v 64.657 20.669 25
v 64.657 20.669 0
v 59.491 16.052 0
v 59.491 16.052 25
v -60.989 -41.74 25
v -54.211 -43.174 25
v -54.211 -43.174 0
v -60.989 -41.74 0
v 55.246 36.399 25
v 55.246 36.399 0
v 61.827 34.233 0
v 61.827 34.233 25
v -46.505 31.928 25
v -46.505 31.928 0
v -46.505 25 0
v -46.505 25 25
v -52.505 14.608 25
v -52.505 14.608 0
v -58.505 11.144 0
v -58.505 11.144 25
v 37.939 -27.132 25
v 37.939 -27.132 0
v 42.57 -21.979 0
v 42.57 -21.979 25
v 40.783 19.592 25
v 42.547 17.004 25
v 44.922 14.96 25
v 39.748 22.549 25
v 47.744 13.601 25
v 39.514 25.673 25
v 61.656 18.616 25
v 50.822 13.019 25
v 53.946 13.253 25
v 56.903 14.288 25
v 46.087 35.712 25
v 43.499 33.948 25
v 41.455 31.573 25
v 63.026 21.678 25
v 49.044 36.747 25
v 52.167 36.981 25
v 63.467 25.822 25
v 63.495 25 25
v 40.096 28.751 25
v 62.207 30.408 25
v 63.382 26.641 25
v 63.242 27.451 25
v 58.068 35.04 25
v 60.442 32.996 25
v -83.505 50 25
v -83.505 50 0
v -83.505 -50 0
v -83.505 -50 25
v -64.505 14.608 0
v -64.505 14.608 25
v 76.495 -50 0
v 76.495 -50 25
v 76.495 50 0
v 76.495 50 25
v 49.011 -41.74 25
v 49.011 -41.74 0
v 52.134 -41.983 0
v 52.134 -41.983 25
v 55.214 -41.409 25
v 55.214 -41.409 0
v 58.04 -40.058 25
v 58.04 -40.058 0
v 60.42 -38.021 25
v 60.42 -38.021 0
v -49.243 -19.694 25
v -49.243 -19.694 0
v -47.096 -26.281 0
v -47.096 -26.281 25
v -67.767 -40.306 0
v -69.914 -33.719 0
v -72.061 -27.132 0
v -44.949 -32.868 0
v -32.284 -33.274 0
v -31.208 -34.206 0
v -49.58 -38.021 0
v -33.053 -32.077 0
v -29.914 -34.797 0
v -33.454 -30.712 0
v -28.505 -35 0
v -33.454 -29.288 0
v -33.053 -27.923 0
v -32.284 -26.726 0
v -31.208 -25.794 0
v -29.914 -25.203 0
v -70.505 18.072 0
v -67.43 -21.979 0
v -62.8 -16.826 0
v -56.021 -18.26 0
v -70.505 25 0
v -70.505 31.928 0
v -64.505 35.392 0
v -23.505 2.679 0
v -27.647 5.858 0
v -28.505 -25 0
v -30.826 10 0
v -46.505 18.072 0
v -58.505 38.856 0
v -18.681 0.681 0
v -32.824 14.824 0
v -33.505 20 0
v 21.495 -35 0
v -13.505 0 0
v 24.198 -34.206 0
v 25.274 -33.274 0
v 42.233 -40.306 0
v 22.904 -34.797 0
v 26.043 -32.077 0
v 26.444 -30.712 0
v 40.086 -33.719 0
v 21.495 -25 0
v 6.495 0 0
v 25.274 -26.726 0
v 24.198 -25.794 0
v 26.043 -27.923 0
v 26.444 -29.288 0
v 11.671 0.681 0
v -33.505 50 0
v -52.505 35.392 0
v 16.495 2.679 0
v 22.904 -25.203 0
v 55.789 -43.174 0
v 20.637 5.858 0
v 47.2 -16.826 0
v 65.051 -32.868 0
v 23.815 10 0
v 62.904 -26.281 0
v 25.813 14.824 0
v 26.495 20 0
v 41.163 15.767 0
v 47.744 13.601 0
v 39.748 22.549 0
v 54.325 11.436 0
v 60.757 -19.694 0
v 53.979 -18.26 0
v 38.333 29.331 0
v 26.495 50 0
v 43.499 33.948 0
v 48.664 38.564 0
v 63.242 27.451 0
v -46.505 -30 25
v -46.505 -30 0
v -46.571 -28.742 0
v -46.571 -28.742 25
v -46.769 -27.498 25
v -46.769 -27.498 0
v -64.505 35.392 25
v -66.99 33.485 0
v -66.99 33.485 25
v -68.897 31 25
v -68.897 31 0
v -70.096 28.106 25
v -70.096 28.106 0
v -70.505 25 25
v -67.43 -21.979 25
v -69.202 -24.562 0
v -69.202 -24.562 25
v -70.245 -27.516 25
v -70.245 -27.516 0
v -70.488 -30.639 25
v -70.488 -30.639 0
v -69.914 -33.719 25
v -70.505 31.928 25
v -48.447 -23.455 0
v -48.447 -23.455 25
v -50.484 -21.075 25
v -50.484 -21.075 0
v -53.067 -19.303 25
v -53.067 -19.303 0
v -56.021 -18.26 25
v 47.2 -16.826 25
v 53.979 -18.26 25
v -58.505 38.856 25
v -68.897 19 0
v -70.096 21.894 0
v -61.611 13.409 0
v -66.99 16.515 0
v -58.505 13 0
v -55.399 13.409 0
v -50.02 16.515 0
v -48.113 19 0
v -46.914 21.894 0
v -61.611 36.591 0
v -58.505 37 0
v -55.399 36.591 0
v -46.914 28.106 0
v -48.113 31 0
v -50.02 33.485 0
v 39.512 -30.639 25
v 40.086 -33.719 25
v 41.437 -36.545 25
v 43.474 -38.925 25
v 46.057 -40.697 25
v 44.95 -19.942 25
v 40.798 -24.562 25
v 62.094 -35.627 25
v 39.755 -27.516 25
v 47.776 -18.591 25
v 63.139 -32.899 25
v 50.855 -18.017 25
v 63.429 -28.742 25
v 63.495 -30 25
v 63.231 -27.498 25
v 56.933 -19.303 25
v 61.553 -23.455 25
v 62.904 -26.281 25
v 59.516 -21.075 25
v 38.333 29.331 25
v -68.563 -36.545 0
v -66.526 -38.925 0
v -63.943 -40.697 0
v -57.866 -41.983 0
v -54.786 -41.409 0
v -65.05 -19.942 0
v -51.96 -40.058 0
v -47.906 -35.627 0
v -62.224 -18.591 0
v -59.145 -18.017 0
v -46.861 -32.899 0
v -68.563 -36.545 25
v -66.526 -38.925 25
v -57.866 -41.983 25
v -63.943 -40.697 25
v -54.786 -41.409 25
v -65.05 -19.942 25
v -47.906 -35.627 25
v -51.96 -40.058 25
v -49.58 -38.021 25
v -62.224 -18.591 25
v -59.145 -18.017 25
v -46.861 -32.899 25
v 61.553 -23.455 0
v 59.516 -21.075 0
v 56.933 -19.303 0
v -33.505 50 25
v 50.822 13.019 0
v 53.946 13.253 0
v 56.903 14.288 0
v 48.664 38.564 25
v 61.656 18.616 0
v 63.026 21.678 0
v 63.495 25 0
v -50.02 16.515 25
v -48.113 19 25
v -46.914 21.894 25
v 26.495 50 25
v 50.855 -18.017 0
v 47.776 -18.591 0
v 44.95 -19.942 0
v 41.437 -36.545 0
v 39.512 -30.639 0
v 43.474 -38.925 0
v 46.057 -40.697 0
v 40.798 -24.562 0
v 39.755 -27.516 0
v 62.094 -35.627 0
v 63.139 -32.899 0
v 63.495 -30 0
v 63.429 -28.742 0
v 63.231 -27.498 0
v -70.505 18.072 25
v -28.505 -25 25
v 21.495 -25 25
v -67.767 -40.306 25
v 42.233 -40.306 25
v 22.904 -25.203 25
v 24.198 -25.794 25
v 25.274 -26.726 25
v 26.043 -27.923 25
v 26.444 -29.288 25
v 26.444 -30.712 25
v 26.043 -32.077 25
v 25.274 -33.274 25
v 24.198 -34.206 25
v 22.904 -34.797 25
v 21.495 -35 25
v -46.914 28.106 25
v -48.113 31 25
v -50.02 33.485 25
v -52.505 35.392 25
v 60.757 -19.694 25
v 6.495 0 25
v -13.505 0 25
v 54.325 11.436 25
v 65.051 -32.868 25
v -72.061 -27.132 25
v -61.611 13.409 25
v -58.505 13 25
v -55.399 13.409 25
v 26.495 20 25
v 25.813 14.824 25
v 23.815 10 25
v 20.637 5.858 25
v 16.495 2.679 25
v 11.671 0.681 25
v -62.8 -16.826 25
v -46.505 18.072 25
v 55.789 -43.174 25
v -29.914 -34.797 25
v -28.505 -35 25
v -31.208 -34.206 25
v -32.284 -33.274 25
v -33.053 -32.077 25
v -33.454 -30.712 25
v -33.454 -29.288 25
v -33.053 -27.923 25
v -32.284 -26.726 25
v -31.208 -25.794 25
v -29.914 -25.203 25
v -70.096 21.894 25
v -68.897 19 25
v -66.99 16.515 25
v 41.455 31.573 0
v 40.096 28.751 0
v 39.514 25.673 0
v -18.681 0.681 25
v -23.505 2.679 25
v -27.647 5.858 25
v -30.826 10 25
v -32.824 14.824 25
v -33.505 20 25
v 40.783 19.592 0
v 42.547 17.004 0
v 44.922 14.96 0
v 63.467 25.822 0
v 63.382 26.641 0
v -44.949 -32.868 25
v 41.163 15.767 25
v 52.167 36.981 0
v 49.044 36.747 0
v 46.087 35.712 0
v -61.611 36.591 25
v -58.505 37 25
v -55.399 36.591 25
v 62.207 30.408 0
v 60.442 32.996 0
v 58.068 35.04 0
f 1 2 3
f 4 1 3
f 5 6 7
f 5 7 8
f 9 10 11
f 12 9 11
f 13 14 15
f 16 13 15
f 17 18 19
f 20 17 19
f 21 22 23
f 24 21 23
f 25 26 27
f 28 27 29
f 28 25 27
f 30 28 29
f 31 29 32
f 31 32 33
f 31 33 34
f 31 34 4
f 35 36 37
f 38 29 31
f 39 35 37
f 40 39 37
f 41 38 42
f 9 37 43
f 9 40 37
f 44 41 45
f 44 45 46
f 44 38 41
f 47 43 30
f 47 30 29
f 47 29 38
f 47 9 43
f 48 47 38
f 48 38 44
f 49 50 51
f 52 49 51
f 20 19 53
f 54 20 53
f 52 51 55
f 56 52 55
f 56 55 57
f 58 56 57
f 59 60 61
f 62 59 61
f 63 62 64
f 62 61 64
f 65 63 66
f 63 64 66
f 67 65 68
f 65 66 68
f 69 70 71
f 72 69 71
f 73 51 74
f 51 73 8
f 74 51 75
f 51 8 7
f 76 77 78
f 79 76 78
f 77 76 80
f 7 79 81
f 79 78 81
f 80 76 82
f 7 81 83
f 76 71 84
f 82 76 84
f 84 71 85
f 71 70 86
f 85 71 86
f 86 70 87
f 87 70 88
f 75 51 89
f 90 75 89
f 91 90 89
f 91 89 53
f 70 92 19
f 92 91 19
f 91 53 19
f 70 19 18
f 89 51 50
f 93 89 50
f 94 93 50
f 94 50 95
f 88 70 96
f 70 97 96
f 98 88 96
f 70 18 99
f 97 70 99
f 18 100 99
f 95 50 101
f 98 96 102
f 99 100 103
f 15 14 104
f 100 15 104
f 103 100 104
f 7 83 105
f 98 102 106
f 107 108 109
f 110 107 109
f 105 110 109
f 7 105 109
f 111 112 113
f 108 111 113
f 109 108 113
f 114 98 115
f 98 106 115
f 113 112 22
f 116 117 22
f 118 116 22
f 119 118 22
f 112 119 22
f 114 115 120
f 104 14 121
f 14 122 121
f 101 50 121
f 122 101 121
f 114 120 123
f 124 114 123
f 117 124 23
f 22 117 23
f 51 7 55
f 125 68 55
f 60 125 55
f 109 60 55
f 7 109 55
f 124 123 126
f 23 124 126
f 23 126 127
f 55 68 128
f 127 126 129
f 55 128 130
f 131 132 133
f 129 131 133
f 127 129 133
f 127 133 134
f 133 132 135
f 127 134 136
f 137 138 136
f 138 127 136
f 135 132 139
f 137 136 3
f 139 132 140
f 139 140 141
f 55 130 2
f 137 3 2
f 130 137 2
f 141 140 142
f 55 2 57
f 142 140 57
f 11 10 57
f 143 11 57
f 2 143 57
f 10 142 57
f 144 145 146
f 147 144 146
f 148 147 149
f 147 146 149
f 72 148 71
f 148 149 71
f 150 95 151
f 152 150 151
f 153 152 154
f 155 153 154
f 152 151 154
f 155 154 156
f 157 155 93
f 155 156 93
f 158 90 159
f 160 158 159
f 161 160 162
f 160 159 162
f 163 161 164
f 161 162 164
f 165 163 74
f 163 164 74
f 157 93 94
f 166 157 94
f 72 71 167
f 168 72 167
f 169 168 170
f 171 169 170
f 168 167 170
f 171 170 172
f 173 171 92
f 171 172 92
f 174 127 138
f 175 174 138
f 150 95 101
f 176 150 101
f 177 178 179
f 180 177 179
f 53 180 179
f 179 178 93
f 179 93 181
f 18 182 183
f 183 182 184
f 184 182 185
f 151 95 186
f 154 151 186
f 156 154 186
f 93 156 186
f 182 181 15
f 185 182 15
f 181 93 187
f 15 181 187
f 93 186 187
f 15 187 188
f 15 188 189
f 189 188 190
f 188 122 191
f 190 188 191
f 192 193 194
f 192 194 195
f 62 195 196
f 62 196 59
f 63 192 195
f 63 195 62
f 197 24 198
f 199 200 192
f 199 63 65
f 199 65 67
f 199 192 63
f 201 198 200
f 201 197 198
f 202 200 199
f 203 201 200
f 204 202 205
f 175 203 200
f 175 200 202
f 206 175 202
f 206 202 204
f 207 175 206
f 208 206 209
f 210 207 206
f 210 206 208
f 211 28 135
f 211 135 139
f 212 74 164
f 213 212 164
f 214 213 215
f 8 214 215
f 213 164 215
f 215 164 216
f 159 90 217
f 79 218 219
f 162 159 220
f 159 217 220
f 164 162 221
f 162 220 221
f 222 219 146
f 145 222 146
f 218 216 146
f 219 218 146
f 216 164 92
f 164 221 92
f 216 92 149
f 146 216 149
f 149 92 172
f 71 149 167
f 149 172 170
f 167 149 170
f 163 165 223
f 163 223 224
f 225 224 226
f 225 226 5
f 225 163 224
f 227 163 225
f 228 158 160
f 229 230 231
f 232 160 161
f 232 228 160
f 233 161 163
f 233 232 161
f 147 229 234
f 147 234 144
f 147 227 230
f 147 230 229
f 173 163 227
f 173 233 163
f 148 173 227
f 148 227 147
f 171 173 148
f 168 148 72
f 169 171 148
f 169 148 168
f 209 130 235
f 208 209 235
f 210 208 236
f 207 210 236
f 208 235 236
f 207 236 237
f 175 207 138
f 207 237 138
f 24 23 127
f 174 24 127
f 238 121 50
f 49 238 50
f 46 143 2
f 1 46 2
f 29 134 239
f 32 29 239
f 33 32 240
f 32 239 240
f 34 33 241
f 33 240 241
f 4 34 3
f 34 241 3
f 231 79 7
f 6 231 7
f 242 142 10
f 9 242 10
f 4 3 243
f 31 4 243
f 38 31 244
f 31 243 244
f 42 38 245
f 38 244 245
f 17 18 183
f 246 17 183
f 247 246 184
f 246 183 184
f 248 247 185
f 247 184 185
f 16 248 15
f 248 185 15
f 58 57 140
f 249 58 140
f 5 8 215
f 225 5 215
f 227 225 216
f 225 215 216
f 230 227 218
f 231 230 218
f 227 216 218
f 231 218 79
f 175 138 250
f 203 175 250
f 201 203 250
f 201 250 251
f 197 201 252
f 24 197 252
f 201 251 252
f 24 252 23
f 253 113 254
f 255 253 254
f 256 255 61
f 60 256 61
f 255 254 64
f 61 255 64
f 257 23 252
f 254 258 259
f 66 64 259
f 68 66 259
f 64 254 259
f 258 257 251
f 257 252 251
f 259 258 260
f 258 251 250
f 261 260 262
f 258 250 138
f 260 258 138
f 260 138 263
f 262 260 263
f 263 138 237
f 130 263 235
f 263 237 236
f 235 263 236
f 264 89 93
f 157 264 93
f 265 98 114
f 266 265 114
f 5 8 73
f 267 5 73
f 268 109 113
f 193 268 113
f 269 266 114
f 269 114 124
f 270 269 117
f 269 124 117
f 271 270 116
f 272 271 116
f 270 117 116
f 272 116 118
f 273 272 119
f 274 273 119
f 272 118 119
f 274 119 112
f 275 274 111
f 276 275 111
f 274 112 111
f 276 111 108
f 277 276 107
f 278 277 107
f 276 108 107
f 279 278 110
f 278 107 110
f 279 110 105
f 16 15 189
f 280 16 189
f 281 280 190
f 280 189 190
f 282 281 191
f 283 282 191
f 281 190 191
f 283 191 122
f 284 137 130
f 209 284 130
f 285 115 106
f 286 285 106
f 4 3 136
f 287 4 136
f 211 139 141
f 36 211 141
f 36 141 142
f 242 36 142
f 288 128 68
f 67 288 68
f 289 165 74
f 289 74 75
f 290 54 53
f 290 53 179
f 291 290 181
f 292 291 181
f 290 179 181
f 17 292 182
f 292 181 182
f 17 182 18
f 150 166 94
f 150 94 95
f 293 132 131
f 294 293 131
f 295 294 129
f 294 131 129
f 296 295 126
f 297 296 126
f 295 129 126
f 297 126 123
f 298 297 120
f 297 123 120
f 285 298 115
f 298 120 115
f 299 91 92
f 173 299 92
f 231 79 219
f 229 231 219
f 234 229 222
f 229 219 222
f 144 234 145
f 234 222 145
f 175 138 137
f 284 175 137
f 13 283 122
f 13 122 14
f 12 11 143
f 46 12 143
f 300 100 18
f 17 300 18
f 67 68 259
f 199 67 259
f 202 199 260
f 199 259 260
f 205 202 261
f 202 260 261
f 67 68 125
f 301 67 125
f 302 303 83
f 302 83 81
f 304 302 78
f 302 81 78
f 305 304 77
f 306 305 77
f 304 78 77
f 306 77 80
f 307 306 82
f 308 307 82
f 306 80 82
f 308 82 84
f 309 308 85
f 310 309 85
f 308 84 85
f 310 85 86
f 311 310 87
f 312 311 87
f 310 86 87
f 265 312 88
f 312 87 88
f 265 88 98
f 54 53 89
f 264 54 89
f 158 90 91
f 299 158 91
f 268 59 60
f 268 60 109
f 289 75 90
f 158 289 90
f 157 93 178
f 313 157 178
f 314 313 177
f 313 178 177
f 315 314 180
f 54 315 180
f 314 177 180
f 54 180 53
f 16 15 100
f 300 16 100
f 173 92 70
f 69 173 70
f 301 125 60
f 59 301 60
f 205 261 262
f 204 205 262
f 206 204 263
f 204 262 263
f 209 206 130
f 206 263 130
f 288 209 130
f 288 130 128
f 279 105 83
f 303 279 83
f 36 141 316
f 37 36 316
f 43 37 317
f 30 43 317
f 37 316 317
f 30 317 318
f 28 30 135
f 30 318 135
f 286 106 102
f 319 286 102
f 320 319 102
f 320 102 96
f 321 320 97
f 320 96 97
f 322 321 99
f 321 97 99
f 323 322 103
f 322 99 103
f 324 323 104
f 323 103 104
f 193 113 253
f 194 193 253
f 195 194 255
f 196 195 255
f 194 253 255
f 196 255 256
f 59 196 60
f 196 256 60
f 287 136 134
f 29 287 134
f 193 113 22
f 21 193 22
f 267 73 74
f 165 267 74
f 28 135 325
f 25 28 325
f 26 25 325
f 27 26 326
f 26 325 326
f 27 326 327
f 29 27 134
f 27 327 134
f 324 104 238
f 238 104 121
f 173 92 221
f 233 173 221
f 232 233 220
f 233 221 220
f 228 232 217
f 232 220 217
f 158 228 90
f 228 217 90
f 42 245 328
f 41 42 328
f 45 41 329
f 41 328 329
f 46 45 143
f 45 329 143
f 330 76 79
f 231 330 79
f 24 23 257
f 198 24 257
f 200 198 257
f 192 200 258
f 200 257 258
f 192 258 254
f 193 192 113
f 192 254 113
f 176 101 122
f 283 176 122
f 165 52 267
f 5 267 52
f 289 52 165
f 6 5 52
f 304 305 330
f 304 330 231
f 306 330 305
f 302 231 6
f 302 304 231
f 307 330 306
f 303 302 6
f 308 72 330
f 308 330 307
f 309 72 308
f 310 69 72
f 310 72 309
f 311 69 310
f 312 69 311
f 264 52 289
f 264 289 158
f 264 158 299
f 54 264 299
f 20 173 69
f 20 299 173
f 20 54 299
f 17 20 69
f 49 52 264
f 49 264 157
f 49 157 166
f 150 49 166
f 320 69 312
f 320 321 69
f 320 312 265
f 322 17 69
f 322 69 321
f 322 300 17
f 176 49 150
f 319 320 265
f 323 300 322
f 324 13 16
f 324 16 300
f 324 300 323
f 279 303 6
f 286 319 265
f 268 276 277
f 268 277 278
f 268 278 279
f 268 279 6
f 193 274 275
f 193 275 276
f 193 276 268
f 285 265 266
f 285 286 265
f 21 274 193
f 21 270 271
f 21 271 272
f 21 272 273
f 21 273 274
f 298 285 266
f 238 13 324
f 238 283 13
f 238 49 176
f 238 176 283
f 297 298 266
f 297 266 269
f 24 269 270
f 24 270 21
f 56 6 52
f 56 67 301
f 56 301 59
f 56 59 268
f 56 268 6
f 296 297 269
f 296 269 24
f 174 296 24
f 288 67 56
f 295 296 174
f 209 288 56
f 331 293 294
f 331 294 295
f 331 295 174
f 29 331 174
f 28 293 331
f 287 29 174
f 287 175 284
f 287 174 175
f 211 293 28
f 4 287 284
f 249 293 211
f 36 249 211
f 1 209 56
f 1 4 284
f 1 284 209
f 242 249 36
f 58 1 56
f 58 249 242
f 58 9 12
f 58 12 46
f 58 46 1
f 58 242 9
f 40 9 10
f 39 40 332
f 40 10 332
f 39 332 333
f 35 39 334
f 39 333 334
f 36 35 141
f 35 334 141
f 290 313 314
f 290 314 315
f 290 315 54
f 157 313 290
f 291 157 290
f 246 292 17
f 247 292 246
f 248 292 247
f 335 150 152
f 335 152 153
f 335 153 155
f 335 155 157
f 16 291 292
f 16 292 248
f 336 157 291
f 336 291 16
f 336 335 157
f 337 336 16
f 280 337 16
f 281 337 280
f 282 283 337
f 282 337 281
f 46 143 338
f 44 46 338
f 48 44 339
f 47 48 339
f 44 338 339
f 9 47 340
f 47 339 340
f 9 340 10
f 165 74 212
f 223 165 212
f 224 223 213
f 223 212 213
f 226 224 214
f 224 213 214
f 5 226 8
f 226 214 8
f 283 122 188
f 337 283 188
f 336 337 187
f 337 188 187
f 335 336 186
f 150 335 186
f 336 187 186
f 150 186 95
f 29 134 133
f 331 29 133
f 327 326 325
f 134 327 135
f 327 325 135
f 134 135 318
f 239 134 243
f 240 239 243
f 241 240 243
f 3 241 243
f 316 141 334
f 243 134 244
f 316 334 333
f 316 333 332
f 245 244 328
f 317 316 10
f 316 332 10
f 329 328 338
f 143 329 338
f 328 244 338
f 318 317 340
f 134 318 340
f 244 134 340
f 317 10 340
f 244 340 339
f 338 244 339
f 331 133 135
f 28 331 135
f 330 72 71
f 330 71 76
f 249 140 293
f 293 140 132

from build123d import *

# Parameters (mm, degrees)
F1_DEPTH = 25


with BuildPart() as f1:
    # F0 (on Top) → F1 (new body)
    with BuildSketch(Plane.XY):
        with BuildLine():
            Line((-58.5051, -50), (-28.5051, -50))
            Line((-28.5051, -50), (21.4949, -50))
            Line((21.4949, -50), (51.4949, -50))
            Line((51.4949, -50), (76.4949, -50))
            Line((76.4949, -50), (76.4949, -30))
            Line((76.4949, -30), (76.4949, 25))
            Line((76.4949, 25), (76.4949, 50))
            Line((76.4949, 50), (26.4949, 50))
            Line((26.4949, 50), (26.4949, 20))
            ThreePointArc((26.4949, 20), (20.637035, 5.857864), (6.4949, 0))
            Line((6.4949, 0), (-13.5051, 0))
            ThreePointArc((-13.5051, 0), (-27.647236, 5.857864), (-33.5051, 20))
            Line((-33.5051, 20), (-33.5051, 50))
            Line((-33.5051, 50), (-83.5051, 50))
            Line((-83.5051, 50), (-83.5051, 25))
            Line((-83.5051, 25), (-83.5051, -30))
            Line((-83.5051, -30), (-83.5051, -50))
            Line((-83.5051, -50), (-58.5051, -50))
        make_face()
        Polygon((-49.243183, -19.693842), (-47.095965, -26.280909), (-44.948747, -32.867977), (-49.579706, -38.021056), (-54.210664, -43.174135), (-60.988841, -41.740146), (-67.767017, -40.306158), (-69.914235, -33.719091), (-72.061453, -27.132023), (-67.430495, -21.978944), (-62.799536, -16.825865), (-56.02136, -18.259854), align=None, mode=Mode.SUBTRACT)
        with BuildLine():
            ThreePointArc((21.4949, -25), (26.4949, -30), (21.4949, -35))
            Line((21.4949, -35), (-28.5051, -35))
            ThreePointArc((-28.5051, -35), (-33.5051, -30), (-28.5051, -25))
            Line((-28.5051, -25), (21.4949, -25))
        make_face(mode=Mode.SUBTRACT)
        Polygon((60.756817, -19.693842), (62.904035, -26.280909), (65.051253, -32.867977), (60.420295, -38.021055), (55.789336, -43.174135), (49.011158, -41.740146), (42.232983, -40.306158), (40.085765, -33.719091), (37.938547, -27.132023), (42.569505, -21.978944), (47.200464, -16.825865), (53.97864, -18.259854), align=None, mode=Mode.SUBTRACT)
        Polygon((-46.5051, 31.928203), (-46.5051, 25), (-46.5051, 18.071797), (-52.5051, 14.607695), (-58.5051, 11.143594), (-64.5051, 14.607695), (-70.5051, 18.071797), (-70.5051, 25), (-70.5051, 31.928203), (-64.5051, 35.392305), (-58.5051, 38.856406), (-52.5051, 35.392305), align=None, mode=Mode.SUBTRACT)
        Polygon((61.82662, 34.233394), (63.241867, 27.451279), (64.657113, 20.669165), (59.491254, 16.052468), (54.325393, 11.435771), (47.744286, 13.601189), (41.16318, 15.766606), (39.747933, 22.548721), (38.332686, 29.330835), (43.498546, 33.947532), (48.664406, 38.564229), (55.245513, 36.398811), align=None, mode=Mode.SUBTRACT)
        with BuildLine():
            ThreePointArc((-52.5051, 14.607695), (-48.112795, 19), (-46.5051, 25))
            ThreePointArc((-46.5051, 25), (-48.112795, 31), (-52.5051, 35.392305))
            ThreePointArc((-52.5051, 35.392305), (-58.5051, 37), (-64.5051, 35.392305))
            ThreePointArc((-64.5051, 35.392305), (-68.897405, 31), (-70.5051, 25))
            ThreePointArc((-70.5051, 25), (-68.897405, 19), (-64.5051, 14.607695))
            ThreePointArc((-64.5051, 14.607695), (-58.5051, 13), (-52.5051, 14.607695))
        make_face()
        with BuildLine():
            ThreePointArc((-49.579706, -38.021056), (-47.300085, -34.295071), (-46.5051, -30))
            ThreePointArc((-46.5051, -30), (-46.653737, -28.117133), (-47.095965, -26.280909))
            ThreePointArc((-47.095965, -26.280909), (-50.484045, -21.074605), (-56.02136, -18.259854))
            ThreePointArc((-56.02136, -18.259854), (-62.224191, -18.590865), (-67.430495, -21.978944))
            ThreePointArc((-67.430495, -21.978944), (-70.245246, -27.516259), (-69.914235, -33.719091))
            ThreePointArc((-69.914235, -33.719091), (-66.526156, -38.925394), (-60.988841, -41.740146))
            ThreePointArc((-60.988841, -41.740146), (-54.78601, -41.409135), (-49.579706, -38.021056))
        make_face()
        with BuildLine():
            ThreePointArc((60.420295, -38.021055), (62.699915, -34.29507), (63.4949, -30))
            ThreePointArc((63.4949, -30), (63.346263, -28.117133), (62.904035, -26.280909))
            ThreePointArc((62.904035, -26.280909), (59.515955, -21.074605), (53.97864, -18.259854))
            ThreePointArc((53.97864, -18.259854), (47.775809, -18.590865), (42.569505, -21.978944))
            ThreePointArc((42.569505, -21.978944), (39.754754, -27.51626), (40.085765, -33.719091))
            ThreePointArc((40.085765, -33.719091), (43.473844, -38.925394), (49.011158, -41.740146))
            ThreePointArc((49.011158, -41.740146), (55.21399, -41.409135), (60.420295, -38.021055))
        make_face()
        with BuildLine():
            ThreePointArc((59.491254, 16.052468), (62.448352, 20.098788), (63.4949, 25))
            ThreePointArc((63.4949, 25), (63.431474, 26.232152), (63.241867, 27.451279))
            ThreePointArc((63.241867, 27.451279), (60.442432, 32.996353), (55.245513, 36.398811))
            ThreePointArc((55.245513, 36.398811), (49.043621, 36.746967), (43.498546, 33.947532))
            ThreePointArc((43.498546, 33.947532), (40.096089, 28.750614), (39.747933, 22.548721))
            ThreePointArc((39.747933, 22.548721), (42.547367, 17.003647), (47.744286, 13.601189))
            ThreePointArc((47.744286, 13.601189), (53.946179, 13.253033), (59.491254, 16.052468))
        make_face()
    extrude(amount=F1_DEPTH)


solid = f1.part
